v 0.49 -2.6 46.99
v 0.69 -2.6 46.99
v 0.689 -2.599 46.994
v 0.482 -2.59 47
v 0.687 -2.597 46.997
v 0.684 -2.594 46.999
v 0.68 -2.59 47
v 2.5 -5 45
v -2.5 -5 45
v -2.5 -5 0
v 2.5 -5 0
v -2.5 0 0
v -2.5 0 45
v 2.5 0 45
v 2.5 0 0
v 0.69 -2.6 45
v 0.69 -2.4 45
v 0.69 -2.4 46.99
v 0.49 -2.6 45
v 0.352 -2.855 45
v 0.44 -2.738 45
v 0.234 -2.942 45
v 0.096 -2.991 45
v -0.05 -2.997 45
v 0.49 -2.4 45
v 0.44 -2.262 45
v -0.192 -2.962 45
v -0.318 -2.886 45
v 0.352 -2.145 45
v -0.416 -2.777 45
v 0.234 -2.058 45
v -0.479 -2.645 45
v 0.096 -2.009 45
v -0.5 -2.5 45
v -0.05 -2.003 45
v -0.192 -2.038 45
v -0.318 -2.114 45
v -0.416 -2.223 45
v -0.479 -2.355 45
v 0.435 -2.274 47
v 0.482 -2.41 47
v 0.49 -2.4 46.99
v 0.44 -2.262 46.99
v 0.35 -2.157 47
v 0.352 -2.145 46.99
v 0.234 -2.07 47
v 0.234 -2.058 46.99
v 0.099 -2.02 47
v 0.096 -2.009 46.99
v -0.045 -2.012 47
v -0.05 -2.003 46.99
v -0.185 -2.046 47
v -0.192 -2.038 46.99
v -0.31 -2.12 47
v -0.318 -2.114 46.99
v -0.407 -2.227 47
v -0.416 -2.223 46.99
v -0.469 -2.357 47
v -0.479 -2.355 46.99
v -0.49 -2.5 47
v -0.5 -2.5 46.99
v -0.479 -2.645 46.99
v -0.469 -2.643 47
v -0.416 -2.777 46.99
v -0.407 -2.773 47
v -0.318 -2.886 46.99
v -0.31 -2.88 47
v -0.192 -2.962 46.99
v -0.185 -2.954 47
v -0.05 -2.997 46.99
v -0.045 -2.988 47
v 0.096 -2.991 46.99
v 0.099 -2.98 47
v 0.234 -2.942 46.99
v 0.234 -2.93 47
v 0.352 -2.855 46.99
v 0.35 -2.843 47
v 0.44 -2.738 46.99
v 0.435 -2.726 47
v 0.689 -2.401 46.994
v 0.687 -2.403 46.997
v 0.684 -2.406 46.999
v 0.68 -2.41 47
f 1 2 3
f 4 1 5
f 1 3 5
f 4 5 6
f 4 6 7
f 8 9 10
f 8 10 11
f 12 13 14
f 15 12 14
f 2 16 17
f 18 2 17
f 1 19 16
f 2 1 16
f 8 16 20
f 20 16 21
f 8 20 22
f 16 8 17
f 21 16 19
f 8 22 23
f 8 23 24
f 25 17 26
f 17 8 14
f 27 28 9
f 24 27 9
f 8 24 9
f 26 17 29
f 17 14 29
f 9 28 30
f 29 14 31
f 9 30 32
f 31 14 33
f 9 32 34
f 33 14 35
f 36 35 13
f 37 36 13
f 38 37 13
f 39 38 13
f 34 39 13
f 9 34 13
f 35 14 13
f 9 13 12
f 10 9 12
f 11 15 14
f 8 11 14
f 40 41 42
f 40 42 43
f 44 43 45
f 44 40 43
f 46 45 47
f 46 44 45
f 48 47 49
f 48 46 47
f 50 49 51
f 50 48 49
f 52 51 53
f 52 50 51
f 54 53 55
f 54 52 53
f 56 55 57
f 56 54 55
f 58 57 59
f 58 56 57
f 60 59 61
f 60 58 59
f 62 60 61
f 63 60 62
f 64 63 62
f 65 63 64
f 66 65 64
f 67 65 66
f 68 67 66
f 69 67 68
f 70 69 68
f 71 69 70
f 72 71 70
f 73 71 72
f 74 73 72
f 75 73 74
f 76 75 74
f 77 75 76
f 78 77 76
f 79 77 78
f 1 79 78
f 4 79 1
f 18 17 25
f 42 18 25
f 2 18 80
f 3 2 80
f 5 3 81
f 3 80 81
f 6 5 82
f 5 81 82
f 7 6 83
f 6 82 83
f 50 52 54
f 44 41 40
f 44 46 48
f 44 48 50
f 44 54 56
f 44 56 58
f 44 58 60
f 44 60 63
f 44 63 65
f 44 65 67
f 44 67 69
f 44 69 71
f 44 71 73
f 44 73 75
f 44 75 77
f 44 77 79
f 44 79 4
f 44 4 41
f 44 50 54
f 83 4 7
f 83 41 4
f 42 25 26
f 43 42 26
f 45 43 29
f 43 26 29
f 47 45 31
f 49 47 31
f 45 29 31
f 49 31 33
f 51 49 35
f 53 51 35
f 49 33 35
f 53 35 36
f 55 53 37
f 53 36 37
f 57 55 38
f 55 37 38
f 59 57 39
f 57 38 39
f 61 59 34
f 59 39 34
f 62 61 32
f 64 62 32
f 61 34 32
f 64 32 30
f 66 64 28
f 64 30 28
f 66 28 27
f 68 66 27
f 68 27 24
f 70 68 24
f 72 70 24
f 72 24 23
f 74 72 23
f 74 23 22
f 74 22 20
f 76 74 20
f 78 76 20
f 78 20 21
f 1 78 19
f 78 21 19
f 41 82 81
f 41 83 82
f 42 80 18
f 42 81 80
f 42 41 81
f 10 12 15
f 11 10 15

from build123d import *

# Parameters (mm, degrees)
F1_DEPTH = 5
F3_DEPTH = 2
F4_DEPTH = 2
F5_R     = 0.01


with BuildPart() as f1:
    # F0 (on Front) → F1 (new body)
    with BuildSketch(Plane.XZ):
        Polygon((-2.5, 45), (-2.5, 0), (2.5, 0), (2.5, 45), (0, 45), align=None)
    extrude(amount=F1_DEPTH)

    # F2 (on face) → F3 (join)
    with BuildSketch(Plane.XY.offset(45)):
        with BuildLine():
            ThreePointArc((0.489898, -2.6), (0.497468, -2.550254), (0.5, -2.5))
            ThreePointArc((0.5, -2.5), (0.497468, -2.449746), (0.489898, -2.4))
            ThreePointArc((0.489898, -2.4), (-0.5, -2.5), (0.489898, -2.6))
        make_face()
    extrude(amount=F3_DEPTH)

    # F2 (on face) → F4 (join, through all)
    with BuildSketch(Plane.XY.offset(45)):
        with BuildLine():
            ThreePointArc((0.489898, -2.4), (0.497468, -2.449746), (0.5, -2.5))
            ThreePointArc((0.5, -2.5), (0.497468, -2.550254), (0.489898, -2.6))
            Line((0.489898, -2.6), (0.689898, -2.6))
            Line((0.689898, -2.6), (0.689898, -2.5))
            Line((0.689898, -2.5), (0.689898, -2.4))
            Line((0.689898, -2.4), (0.489898, -2.4))
        make_face()
    extrude(amount=F4_DEPTH)

    # F5
    f5_edges = [f1.edges().sort_by_distance(p)[0] for p in [
        (0.589898, -2.6, 47),
        (0.689898, -2.5, 47),
        (0.589898, -2.4, 47),
        (-0.5, -2.5, 47),
    ]]
    fillet(f5_edges, radius=F5_R)


solid = f1.part
